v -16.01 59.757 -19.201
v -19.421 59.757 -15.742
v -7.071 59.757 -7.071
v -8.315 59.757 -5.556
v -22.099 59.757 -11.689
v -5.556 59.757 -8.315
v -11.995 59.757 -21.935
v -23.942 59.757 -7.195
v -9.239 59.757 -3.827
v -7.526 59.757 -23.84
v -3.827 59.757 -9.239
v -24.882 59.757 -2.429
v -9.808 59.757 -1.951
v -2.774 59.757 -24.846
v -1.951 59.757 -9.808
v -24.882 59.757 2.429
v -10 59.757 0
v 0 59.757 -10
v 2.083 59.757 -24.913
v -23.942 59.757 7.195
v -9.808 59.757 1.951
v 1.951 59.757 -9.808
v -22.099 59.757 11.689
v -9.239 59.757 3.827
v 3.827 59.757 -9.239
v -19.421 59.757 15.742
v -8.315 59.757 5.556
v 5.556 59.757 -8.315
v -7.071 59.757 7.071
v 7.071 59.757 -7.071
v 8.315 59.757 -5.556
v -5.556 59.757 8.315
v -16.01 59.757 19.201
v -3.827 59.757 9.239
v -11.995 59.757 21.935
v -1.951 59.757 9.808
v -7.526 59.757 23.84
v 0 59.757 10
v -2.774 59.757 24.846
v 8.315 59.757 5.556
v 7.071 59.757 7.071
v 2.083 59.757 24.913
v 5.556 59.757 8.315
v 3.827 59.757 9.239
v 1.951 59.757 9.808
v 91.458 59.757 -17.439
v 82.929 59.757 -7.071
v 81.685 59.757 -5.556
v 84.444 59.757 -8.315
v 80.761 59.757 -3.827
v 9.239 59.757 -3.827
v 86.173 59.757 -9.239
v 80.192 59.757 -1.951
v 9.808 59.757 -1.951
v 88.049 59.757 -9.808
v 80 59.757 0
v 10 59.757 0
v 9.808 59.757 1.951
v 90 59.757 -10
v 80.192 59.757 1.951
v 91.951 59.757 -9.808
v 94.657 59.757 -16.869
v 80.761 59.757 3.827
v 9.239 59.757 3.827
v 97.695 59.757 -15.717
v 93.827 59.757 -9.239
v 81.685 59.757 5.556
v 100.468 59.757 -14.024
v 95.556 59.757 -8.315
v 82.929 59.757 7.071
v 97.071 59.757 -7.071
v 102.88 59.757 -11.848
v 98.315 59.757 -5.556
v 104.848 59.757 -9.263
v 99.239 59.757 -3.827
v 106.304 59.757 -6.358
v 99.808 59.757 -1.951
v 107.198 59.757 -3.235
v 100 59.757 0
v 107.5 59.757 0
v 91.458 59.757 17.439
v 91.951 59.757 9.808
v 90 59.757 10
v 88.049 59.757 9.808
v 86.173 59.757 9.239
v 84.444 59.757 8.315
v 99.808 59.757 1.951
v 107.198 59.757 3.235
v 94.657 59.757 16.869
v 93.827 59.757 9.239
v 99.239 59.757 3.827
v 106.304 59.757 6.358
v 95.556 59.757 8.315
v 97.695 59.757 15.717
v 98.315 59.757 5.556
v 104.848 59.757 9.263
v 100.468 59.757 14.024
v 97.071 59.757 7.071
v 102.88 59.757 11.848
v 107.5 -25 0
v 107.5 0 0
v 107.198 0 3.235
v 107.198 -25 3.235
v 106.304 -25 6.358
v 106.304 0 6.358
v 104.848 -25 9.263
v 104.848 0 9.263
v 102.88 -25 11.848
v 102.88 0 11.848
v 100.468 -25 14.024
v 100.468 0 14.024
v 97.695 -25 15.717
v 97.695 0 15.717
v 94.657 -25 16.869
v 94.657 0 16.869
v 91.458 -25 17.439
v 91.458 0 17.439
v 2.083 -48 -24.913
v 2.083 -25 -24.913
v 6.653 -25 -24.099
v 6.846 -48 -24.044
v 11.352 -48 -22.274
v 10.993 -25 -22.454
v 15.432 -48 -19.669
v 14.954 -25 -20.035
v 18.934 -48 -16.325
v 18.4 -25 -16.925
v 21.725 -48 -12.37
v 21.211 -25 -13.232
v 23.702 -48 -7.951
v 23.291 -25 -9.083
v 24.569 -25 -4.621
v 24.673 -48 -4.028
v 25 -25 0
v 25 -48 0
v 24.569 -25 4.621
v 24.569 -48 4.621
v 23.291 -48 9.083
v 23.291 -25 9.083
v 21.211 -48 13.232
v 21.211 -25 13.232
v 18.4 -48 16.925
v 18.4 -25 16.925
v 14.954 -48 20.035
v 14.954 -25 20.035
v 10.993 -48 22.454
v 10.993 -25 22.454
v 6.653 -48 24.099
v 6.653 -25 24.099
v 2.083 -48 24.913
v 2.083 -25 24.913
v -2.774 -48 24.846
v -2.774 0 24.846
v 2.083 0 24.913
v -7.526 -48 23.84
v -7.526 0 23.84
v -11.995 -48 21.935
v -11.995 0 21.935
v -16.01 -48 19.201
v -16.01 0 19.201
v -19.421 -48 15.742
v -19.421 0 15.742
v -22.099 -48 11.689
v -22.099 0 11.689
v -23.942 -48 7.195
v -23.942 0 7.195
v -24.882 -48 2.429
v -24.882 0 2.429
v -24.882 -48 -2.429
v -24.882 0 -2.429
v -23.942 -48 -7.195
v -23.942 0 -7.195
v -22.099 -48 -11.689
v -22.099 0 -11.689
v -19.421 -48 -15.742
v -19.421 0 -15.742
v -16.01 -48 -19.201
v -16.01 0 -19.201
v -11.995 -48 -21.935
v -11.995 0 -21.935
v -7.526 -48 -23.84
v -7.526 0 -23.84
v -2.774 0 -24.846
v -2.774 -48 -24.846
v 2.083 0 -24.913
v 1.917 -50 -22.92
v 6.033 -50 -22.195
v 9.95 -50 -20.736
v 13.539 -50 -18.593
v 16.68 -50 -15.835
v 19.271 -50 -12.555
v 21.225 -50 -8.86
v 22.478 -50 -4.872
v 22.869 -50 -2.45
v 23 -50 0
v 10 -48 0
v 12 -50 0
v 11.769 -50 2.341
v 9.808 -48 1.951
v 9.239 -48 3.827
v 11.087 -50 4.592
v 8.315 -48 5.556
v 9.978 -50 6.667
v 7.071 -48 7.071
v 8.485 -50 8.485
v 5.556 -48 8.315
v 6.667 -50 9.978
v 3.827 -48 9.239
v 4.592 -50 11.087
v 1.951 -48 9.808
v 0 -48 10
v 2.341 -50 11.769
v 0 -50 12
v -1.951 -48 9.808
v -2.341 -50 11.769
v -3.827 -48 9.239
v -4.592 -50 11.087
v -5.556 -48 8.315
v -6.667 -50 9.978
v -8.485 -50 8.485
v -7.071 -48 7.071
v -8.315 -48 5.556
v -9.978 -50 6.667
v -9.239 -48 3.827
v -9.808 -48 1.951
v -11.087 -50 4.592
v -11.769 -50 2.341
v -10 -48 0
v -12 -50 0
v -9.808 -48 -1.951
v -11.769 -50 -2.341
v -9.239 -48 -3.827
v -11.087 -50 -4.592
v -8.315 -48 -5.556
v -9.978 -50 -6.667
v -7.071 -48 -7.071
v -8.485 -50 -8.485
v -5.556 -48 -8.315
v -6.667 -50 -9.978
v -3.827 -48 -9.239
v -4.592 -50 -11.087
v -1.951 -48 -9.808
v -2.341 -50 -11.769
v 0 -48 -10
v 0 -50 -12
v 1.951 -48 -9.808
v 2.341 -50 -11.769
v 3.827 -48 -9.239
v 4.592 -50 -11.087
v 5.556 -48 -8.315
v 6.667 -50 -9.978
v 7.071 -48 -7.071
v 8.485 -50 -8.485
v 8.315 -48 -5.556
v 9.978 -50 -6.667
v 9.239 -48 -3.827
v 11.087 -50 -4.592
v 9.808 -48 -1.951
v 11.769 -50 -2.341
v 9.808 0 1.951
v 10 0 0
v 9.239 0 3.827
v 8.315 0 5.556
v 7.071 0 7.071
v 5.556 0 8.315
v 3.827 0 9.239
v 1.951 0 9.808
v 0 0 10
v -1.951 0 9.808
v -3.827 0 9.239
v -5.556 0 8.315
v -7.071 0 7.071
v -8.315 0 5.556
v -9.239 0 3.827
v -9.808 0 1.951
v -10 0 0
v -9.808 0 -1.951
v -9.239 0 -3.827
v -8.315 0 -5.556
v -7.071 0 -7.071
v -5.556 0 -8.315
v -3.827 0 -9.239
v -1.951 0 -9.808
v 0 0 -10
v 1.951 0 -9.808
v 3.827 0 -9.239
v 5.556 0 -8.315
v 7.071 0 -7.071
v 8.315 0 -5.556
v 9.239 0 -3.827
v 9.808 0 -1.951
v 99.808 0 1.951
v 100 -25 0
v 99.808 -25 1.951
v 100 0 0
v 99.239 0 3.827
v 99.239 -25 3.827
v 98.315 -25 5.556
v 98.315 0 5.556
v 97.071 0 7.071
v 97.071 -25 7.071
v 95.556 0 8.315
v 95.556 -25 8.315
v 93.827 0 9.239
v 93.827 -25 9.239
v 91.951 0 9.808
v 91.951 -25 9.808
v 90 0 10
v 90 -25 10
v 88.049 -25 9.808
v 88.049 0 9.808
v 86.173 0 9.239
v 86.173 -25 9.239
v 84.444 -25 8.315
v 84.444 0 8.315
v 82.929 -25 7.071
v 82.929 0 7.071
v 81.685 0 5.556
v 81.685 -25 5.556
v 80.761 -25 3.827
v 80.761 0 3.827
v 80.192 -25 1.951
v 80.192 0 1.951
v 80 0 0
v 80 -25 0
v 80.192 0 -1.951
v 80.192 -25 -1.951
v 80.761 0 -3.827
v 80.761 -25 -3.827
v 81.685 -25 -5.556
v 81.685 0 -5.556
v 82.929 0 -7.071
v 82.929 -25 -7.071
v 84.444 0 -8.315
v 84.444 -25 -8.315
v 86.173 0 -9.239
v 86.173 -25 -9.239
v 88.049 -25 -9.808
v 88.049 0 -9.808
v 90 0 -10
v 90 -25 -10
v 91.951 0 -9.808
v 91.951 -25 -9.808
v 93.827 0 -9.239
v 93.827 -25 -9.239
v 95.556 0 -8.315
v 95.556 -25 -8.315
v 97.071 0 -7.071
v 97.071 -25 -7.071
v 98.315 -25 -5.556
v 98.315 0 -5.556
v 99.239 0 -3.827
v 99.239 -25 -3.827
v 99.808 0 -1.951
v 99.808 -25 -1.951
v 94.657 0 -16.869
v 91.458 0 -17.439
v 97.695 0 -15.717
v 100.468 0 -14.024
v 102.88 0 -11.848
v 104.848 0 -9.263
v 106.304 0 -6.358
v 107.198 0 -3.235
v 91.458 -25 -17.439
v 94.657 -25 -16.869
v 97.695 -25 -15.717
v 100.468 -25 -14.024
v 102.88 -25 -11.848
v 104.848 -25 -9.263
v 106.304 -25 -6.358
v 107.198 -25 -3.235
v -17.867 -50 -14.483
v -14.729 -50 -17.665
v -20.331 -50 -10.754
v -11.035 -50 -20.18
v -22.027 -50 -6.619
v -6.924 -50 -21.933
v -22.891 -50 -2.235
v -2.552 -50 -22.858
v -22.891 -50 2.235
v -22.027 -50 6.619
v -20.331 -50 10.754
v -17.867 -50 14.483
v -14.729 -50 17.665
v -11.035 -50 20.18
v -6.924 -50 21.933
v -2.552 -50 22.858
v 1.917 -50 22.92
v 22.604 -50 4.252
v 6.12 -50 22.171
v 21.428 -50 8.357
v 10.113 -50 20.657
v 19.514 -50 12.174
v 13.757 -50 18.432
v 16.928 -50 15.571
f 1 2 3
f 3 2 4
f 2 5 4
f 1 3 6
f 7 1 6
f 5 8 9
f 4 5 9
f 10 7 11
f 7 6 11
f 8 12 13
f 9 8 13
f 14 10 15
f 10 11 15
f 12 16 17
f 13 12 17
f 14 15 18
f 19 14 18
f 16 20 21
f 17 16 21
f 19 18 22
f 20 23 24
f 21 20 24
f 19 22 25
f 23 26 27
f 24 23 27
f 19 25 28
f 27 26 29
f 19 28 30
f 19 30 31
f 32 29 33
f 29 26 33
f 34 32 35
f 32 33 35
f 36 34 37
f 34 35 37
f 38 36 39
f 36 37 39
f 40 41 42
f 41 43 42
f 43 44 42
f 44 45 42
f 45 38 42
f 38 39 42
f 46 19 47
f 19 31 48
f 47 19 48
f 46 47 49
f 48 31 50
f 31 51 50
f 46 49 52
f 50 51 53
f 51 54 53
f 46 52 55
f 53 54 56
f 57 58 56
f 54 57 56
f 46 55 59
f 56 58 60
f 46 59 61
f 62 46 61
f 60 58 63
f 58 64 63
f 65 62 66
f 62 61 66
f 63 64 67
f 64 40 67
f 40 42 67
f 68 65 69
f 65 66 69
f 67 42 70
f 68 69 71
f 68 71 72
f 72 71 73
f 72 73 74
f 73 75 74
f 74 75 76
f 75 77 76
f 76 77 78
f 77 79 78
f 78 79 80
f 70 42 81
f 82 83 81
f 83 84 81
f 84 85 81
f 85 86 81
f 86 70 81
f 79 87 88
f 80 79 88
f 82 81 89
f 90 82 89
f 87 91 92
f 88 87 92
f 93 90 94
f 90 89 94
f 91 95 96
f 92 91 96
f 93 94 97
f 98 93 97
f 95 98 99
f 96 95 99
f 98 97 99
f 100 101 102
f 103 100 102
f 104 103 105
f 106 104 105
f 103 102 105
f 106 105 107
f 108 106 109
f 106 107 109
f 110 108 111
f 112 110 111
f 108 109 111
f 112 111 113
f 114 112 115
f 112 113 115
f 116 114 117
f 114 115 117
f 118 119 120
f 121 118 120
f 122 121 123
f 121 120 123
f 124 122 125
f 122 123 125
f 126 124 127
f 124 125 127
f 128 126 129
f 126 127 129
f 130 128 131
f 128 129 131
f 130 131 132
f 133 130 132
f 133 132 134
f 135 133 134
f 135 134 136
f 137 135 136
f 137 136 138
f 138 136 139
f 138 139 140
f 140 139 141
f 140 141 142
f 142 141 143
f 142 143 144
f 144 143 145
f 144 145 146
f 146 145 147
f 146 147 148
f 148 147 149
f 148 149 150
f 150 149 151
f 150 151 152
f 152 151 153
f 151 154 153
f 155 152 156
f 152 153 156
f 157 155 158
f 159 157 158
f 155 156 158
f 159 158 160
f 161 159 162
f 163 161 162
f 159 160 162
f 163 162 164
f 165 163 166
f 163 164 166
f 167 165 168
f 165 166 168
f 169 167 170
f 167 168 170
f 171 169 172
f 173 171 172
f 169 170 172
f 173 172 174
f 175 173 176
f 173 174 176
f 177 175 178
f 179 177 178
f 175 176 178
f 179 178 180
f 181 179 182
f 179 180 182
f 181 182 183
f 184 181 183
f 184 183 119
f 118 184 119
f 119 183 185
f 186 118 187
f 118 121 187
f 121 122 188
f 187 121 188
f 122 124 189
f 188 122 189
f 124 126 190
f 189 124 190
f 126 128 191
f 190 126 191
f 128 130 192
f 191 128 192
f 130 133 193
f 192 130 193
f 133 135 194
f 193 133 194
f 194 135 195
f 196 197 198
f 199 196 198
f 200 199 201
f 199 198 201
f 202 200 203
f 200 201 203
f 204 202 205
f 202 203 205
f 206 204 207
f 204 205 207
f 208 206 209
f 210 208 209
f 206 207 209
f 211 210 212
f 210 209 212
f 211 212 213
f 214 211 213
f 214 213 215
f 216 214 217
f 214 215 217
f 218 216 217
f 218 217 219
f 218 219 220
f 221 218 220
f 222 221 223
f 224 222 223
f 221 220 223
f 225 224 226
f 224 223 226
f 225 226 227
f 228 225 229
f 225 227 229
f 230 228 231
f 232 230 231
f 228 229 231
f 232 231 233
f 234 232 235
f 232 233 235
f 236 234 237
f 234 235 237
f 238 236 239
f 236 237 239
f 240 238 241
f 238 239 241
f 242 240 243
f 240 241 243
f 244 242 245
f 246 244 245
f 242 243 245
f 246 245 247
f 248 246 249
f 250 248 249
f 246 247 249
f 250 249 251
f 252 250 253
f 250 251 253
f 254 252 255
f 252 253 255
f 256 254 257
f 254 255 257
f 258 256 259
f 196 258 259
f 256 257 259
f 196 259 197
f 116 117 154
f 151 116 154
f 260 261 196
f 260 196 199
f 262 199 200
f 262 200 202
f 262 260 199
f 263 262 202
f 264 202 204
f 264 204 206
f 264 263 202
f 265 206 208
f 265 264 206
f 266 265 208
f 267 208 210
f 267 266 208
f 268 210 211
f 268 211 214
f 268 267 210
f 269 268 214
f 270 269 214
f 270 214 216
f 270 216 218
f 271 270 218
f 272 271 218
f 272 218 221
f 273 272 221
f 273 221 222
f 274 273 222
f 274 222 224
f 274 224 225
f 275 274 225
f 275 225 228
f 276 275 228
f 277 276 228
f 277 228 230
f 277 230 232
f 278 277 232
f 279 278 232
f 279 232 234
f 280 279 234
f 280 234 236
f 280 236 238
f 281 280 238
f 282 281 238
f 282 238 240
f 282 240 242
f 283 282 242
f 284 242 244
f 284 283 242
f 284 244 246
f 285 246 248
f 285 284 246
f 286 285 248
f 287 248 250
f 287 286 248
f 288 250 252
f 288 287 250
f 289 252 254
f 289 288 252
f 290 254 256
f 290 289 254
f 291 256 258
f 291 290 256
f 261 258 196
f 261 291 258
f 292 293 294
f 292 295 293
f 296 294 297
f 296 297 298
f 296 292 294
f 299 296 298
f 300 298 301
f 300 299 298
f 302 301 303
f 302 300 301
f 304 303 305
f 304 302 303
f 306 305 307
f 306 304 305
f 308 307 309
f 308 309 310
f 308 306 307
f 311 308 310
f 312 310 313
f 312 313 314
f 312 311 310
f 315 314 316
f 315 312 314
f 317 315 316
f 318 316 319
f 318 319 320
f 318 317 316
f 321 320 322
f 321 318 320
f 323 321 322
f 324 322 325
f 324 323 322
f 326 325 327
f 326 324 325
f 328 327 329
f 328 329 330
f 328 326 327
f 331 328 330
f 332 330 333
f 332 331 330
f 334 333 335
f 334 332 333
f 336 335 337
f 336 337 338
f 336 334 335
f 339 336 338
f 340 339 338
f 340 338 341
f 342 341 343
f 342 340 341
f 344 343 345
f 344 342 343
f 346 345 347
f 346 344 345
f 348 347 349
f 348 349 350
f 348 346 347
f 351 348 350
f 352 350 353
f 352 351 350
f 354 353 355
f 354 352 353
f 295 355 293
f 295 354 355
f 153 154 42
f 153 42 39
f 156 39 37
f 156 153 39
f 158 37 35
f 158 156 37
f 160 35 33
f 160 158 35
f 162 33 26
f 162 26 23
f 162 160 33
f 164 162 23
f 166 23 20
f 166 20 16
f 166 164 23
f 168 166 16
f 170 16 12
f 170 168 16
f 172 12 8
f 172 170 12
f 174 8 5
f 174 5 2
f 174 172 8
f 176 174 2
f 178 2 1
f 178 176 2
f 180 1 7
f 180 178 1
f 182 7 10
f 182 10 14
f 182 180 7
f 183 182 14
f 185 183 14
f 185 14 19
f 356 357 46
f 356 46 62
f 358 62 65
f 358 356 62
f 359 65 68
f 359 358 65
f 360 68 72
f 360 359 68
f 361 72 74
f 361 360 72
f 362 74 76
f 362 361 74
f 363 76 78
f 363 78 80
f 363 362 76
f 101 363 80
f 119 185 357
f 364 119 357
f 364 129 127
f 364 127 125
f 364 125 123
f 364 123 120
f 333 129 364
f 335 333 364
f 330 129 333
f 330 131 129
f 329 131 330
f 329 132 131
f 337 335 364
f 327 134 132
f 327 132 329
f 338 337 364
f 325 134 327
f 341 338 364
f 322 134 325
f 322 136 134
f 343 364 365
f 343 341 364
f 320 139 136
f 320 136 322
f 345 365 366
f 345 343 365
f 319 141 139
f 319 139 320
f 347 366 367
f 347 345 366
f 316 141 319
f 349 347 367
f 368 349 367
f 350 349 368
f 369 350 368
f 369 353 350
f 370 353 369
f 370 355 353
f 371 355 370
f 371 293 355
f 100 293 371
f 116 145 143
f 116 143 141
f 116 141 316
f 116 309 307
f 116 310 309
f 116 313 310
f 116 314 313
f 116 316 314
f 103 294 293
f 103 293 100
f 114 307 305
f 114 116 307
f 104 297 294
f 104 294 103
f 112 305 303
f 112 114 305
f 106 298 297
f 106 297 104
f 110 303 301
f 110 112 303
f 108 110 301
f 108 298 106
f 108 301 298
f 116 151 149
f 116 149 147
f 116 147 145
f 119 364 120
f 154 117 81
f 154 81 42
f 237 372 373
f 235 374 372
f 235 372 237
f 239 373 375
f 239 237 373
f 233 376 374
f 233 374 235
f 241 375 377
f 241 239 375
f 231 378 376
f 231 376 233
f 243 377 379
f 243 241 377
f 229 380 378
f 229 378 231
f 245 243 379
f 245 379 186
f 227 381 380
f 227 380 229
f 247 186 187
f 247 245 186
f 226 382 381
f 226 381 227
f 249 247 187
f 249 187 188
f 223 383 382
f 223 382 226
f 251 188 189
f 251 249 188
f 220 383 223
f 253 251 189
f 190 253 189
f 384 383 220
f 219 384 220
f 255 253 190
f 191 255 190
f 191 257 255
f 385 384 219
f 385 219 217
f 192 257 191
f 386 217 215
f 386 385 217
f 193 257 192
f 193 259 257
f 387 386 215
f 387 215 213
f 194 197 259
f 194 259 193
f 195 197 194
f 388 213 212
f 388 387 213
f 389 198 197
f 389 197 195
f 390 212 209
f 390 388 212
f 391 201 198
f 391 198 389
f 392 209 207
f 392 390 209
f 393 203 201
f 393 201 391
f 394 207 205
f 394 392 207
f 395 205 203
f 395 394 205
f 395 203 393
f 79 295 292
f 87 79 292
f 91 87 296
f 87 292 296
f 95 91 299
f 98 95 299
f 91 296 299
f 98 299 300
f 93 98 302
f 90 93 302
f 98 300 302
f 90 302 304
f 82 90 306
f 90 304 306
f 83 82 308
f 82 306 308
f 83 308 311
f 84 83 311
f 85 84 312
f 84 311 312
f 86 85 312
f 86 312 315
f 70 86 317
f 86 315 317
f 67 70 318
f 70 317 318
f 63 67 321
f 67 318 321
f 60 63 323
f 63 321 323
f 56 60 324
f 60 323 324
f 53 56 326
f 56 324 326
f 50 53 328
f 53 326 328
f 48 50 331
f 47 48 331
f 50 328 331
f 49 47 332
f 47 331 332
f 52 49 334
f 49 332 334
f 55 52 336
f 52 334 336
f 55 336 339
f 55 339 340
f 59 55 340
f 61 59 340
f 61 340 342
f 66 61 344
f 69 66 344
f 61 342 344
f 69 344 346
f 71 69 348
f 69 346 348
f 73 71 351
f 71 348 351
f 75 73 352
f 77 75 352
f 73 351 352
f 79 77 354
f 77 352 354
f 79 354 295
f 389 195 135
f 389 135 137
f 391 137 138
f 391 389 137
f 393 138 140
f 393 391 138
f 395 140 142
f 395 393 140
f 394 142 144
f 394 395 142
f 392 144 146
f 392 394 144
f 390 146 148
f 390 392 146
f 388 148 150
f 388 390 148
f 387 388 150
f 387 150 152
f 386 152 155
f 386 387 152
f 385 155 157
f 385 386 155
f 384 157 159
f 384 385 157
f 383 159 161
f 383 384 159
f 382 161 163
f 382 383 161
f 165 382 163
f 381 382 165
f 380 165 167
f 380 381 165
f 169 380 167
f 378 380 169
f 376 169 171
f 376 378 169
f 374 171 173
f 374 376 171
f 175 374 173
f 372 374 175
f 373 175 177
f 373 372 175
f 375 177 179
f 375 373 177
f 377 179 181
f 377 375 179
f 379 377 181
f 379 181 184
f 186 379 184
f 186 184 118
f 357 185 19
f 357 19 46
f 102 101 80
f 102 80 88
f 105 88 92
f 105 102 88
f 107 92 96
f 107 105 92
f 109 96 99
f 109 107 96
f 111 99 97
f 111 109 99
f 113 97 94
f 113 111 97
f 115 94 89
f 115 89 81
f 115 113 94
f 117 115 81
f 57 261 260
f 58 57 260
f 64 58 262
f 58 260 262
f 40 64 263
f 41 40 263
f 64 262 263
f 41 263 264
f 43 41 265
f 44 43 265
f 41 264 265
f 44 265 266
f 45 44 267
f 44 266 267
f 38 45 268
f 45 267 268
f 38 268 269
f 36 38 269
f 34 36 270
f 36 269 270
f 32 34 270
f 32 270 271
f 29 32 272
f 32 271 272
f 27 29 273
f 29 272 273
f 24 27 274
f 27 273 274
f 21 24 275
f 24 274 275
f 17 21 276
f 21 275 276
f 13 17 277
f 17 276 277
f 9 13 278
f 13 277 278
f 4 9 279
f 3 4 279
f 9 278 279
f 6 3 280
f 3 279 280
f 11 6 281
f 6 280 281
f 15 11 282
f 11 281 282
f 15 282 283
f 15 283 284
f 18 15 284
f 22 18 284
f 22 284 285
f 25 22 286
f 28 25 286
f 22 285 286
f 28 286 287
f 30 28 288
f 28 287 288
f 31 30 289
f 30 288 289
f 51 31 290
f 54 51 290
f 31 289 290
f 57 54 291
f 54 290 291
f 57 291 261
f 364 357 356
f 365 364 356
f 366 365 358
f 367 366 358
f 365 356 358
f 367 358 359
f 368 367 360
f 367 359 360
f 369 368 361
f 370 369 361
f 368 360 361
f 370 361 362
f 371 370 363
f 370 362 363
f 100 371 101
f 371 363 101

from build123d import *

# Parameters (mm, degrees)
F0_R          = 10
F1_DEPTH      = 25
F2_DEPTH      = 50
F3_SIZE       = 2
F5_DEPTH      = 25
F5_DEPTH_BACK = 59.7565770149


# Not quite as in the source:
# - the program builds the solid bodies; features that only make, move or delete a surface that nothing else refers to are left out


with BuildPart() as f1:
    # F0 (on Front) → F1 (new body)
    with BuildSketch(Plane.XZ):
        with BuildLine():
            ThreePointArc((2.0833333333, -24.9130432148), (18.3995018048, -16.9250800097), (25, 0))
            ThreePointArc((25, 0), (18.3995018048, 16.9250800097), (2.0833333333, 24.9130432148))
            ThreePointArc((2.0833333333, 24.9130432148), (-25, 0), (2.0833333333, -24.9130432148))
        make_face()
        Circle(F0_R, mode=Mode.SUBTRACT)
        with BuildLine():
            ThreePointArc((2.0833333333, 24.9130432148), (18.3995018048, 16.9250800097), (25, 0))
            ThreePointArc((25, 0), (18.3995018048, -16.9250800097), (2.0833333333, -24.9130432148))
            Line((2.0833333333, -24.9130432148), (91.4583333333, -17.4391302504))
            ThreePointArc((91.4583333333, -17.4391302504), (72.5, 0), (91.4583333333, 17.4391302504))
            Line((91.4583333333, 17.4391302504), (2.0833333333, 24.9130432148))
        make_face()
        with BuildLine():
            ThreePointArc((107.5, 0), (102.8796512634, 11.8475560068), (91.4583333333, 17.4391302504))
            ThreePointArc((91.4583333333, 17.4391302504), (72.5, 0), (91.4583333333, -17.4391302504))
            ThreePointArc((91.4583333333, -17.4391302504), (102.8796512634, -11.8475560068), (107.5, 0))
        make_face()
        with Locations((90, 0)):
            Circle(F0_R, mode=Mode.SUBTRACT)
    extrude(amount=F1_DEPTH)

    # F0 (on Front) → F2 (join)
    with BuildSketch(Plane.XZ):
        with BuildLine():
            ThreePointArc((2.0833333333, -24.9130432148), (18.3995018048, -16.9250800097), (25, 0))
            ThreePointArc((25, 0), (18.3995018048, 16.9250800097), (2.0833333333, 24.9130432148))
            ThreePointArc((2.0833333333, 24.9130432148), (-25, 0), (2.0833333333, -24.9130432148))
        make_face()
        Circle(F0_R, mode=Mode.SUBTRACT)
    extrude(amount=F2_DEPTH)

    # F3
    f3_edges = [f1.edges().sort_by_distance(p)[0] for p in [
        (-2.083333, -50, 24.913043),
        (-10, -50, 0),
        (80, -25, 0),
    ]]
    chamfer(f3_edges, length=F3_SIZE)

    # F0 (on Front) → F5 (join, two sides)
    with BuildSketch(Plane.XZ) as f5_sk:
        with BuildLine():
            ThreePointArc((2.0833333333, -24.9130432148), (18.3995018048, -16.9250800097), (25, 0))
            ThreePointArc((25, 0), (18.3995018048, 16.9250800097), (2.0833333333, 24.9130432148))
            ThreePointArc((2.0833333333, 24.9130432148), (-25, 0), (2.0833333333, -24.9130432148))
        make_face()
        Circle(F0_R, mode=Mode.SUBTRACT)
        with BuildLine():
            ThreePointArc((2.0833333333, 24.9130432148), (18.3995018048, 16.9250800097), (25, 0))
            ThreePointArc((25, 0), (18.3995018048, -16.9250800097), (2.0833333333, -24.9130432148))
            Line((2.0833333333, -24.9130432148), (91.4583333333, -17.4391302504))
            ThreePointArc((91.4583333333, -17.4391302504), (72.5, 0), (91.4583333333, 17.4391302504))
            Line((91.4583333333, 17.4391302504), (2.0833333333, 24.9130432148))
        make_face()
        with BuildLine():
            ThreePointArc((107.5, 0), (102.8796512634, 11.8475560068), (91.4583333333, 17.4391302504))
            ThreePointArc((91.4583333333, 17.4391302504), (72.5, 0), (91.4583333333, -17.4391302504))
            ThreePointArc((91.4583333333, -17.4391302504), (102.8796512634, -11.8475560068), (107.5, 0))
        make_face()
        with Locations((90, 0)):
            Circle(F0_R, mode=Mode.SUBTRACT)
    extrude(amount=F5_DEPTH)
    extrude(f5_sk.sketch, amount=-F5_DEPTH_BACK)


solid = f1.part
